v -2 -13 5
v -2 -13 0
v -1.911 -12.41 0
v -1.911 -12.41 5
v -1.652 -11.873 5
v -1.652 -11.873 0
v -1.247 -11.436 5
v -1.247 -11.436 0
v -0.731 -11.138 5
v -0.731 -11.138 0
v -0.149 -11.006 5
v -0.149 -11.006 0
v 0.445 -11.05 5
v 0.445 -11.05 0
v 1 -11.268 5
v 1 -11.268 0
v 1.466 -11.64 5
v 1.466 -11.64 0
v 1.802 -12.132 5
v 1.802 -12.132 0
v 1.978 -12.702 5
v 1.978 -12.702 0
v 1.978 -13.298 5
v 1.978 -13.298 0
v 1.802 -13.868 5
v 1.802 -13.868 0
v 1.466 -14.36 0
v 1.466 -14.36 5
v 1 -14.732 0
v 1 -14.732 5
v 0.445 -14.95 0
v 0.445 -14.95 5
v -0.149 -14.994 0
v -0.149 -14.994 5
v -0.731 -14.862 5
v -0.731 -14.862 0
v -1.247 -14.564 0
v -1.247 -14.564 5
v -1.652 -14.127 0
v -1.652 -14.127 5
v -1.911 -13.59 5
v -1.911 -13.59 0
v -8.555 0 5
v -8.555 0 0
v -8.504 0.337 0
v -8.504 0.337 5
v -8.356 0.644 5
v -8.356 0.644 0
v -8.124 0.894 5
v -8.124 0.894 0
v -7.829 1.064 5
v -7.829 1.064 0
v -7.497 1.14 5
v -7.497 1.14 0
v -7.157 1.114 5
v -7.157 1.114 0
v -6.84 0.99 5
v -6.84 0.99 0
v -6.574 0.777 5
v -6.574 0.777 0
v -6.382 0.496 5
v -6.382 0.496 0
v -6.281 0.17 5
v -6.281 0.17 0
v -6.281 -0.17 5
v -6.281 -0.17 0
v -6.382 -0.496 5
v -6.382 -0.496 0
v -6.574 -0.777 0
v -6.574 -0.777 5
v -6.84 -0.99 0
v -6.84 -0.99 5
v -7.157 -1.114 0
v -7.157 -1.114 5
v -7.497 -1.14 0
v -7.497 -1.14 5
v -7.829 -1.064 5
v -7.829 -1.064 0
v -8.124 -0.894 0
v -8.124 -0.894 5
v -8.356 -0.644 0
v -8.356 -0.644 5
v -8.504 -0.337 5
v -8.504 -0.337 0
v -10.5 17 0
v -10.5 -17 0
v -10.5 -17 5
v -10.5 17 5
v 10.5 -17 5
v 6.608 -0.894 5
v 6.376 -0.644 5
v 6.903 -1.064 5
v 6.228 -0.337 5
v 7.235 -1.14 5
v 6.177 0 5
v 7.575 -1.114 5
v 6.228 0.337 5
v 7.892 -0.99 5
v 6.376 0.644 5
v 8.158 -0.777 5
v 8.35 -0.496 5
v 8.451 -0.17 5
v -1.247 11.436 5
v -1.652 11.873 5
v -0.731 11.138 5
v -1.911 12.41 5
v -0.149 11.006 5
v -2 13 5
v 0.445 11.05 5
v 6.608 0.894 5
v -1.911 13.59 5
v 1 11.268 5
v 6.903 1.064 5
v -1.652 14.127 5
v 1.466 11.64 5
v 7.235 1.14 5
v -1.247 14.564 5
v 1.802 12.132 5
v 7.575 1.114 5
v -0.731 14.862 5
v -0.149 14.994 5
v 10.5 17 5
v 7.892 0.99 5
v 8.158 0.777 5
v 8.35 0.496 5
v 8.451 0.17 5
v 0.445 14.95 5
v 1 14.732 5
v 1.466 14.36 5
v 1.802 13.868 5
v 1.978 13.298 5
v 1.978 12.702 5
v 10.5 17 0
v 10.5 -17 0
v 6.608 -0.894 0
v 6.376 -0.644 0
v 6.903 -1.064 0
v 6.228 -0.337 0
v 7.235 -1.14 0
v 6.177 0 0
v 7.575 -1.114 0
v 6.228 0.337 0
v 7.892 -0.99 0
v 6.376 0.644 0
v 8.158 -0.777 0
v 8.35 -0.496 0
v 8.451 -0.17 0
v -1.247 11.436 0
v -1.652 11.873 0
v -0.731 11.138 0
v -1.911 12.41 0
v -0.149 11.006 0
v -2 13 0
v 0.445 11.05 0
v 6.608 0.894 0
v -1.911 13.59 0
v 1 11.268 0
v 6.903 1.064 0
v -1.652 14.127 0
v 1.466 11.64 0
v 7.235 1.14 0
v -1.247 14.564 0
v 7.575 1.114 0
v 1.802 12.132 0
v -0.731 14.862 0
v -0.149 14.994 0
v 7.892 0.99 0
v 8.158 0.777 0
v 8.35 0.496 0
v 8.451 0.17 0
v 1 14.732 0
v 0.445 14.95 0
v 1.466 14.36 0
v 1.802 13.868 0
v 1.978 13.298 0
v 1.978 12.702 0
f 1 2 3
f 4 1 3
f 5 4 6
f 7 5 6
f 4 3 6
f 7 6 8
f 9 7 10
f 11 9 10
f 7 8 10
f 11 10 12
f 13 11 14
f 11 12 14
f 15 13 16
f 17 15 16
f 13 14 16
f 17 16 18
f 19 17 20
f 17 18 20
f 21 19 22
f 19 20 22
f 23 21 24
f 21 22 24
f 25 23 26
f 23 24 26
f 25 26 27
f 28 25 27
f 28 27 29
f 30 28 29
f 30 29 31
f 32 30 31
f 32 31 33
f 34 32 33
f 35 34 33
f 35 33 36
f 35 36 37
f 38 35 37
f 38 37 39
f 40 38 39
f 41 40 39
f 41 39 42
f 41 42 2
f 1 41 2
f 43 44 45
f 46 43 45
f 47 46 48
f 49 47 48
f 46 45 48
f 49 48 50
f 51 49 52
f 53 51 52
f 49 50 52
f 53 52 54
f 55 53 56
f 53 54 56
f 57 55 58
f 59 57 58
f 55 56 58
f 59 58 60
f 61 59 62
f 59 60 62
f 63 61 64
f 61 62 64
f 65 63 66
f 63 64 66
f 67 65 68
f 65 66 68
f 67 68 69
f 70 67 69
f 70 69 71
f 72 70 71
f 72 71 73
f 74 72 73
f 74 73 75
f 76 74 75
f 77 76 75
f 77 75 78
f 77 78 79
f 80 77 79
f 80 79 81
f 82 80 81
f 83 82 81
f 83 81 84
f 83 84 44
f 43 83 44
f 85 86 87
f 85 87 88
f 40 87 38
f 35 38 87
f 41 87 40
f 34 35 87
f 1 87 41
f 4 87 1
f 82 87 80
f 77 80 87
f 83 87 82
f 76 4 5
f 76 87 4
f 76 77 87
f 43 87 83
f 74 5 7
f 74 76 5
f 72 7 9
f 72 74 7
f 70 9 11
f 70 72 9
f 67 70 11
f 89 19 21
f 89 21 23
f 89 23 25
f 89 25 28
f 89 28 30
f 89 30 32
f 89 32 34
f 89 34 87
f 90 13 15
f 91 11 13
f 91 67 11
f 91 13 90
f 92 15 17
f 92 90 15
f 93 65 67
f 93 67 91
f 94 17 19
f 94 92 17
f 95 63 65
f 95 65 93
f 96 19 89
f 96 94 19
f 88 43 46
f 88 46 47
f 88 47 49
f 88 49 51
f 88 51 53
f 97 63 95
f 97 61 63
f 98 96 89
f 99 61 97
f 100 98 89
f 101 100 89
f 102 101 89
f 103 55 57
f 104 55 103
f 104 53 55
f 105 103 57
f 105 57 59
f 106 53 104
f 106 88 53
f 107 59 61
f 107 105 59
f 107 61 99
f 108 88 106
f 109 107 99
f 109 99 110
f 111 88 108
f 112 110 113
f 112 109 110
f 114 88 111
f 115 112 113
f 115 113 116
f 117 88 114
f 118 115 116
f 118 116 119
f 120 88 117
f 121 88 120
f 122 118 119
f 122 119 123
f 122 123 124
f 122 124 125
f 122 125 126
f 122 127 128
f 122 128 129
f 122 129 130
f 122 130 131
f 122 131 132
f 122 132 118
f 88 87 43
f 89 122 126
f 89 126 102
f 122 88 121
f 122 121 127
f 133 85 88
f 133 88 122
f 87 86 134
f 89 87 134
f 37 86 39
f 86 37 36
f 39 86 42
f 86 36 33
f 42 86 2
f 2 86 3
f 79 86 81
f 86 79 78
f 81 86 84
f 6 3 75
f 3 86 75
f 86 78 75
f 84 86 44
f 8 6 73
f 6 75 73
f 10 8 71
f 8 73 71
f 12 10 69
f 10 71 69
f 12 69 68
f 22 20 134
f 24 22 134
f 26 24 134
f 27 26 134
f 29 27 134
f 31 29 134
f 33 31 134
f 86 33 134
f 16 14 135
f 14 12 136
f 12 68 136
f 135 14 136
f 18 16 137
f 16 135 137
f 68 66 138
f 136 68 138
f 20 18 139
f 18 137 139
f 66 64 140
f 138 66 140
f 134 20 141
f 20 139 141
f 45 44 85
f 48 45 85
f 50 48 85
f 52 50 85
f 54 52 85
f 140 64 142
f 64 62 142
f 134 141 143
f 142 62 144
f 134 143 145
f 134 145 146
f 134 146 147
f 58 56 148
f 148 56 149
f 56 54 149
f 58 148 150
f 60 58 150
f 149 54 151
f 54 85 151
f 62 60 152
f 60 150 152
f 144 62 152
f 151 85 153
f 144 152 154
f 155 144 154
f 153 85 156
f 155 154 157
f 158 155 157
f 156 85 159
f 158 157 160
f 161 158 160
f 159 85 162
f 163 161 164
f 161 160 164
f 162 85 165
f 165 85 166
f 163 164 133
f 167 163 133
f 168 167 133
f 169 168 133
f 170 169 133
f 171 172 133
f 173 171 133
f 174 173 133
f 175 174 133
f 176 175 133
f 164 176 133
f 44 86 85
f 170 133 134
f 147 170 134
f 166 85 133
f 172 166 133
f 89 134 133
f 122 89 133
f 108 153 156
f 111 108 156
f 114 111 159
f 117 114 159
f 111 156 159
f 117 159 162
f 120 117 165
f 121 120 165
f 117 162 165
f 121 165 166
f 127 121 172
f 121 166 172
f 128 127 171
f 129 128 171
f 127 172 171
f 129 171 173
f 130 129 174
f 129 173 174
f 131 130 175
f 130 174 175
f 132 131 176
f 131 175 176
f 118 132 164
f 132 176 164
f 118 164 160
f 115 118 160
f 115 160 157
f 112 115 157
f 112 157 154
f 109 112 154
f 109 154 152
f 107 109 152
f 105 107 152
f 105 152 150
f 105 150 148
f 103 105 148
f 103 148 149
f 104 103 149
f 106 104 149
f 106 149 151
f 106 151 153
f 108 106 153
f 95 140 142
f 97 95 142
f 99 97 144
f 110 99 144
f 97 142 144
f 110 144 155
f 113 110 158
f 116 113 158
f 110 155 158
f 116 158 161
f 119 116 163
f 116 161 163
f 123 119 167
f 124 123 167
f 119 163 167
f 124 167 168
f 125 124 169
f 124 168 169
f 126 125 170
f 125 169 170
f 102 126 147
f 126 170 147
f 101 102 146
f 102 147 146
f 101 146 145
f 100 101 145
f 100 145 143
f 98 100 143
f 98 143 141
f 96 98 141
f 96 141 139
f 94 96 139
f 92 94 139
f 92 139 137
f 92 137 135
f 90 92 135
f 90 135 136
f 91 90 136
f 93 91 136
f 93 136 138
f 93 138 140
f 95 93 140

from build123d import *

# Parameters (mm, degrees)
SKETCH1_W           = 21
SKETCH1_H           = 34
BOSS_EXTRUDE1_DEPTH = 5
SKETCH2_R           = 1.143
CUT_EXTRUDE1_DEPTH  = 10
SKETCH3_R           = 2
CUT_EXTRUDE2_DEPTH  = 10


with BuildPart() as part:
    # Sketch1 → Boss-Extrude1 (new body)
    with BuildSketch(Plane.XY):
        Rectangle(SKETCH1_W, SKETCH1_H)
    extrude(amount=BOSS_EXTRUDE1_DEPTH)

    # Sketch2 → Cut-Extrude1 (cut)
    with BuildSketch(Plane(origin=(0, 0, 0), x_dir=(-1, 0, 0), z_dir=(0, 0, -1))):
        with Locations((7.411509934, 0)):
            Circle(SKETCH2_R)
        with Locations((-7.320490066, 0)):
            Circle(SKETCH2_R)
    extrude(amount=-CUT_EXTRUDE1_DEPTH, mode=Mode.SUBTRACT)

    # Sketch3 → Cut-Extrude2 (cut)
    with BuildSketch(Plane(origin=(0, 0, 0), x_dir=(-1, 0, 0), z_dir=(0, 0, -1))):
        with Locations((0, -13)):
            Circle(SKETCH3_R)
        with Locations((0, 13)):
            Circle(SKETCH3_R)
    extrude(amount=-CUT_EXTRUDE2_DEPTH, mode=Mode.SUBTRACT)


solid = part.part
